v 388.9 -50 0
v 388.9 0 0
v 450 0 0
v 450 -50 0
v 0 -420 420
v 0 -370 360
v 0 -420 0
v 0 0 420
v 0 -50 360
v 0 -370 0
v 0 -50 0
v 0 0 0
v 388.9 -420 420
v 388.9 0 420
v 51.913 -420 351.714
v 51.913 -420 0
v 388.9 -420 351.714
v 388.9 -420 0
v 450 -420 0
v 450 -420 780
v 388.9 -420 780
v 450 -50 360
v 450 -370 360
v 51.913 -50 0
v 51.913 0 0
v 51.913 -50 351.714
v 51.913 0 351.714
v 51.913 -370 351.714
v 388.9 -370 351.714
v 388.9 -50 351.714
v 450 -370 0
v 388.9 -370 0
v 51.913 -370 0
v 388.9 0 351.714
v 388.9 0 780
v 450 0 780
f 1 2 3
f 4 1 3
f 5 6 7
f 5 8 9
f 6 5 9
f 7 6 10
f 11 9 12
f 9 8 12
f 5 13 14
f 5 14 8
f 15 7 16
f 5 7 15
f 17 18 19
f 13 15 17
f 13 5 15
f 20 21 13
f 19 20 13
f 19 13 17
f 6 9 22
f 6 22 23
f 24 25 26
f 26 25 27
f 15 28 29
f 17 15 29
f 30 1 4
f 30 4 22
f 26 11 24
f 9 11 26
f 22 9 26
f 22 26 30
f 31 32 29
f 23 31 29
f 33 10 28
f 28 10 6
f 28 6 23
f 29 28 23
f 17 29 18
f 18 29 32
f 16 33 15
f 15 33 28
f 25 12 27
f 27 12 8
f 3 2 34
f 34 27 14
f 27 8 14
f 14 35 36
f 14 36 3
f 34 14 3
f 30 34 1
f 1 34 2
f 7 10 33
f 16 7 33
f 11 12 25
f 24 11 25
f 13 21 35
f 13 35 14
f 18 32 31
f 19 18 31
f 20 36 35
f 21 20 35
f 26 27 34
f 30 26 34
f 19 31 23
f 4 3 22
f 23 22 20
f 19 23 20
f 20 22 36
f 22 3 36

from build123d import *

# Parameters (mm, degrees)
F1_DEPTH = 420
F2_W     = 320
F2_H     = 360
F3_DEPTH = 450.001


with BuildPart() as f1:
    # F0 (on Front) → F1 (new body)
    with BuildSketch(Plane.XZ):
        Polygon((0, 420), (0, 0), (51.913477, 0), (51.913477, 351.713803), (388.899834, 351.713803), (388.899834, 0), (450, 0), (450, 780), (388.899834, 780), (388.899834, 420), align=None)
    extrude(amount=F1_DEPTH)

    # F2 (on face) → F3 (cut, through all)
    with BuildSketch(Plane(origin=(0, 0, 0), x_dir=(0, -1, 0), z_dir=(-1, 0, 0))):
        with Locations((210, 180)):
            Rectangle(F2_W, F2_H)
    extrude(amount=-F3_DEPTH, mode=Mode.SUBTRACT)


solid = f1.part
